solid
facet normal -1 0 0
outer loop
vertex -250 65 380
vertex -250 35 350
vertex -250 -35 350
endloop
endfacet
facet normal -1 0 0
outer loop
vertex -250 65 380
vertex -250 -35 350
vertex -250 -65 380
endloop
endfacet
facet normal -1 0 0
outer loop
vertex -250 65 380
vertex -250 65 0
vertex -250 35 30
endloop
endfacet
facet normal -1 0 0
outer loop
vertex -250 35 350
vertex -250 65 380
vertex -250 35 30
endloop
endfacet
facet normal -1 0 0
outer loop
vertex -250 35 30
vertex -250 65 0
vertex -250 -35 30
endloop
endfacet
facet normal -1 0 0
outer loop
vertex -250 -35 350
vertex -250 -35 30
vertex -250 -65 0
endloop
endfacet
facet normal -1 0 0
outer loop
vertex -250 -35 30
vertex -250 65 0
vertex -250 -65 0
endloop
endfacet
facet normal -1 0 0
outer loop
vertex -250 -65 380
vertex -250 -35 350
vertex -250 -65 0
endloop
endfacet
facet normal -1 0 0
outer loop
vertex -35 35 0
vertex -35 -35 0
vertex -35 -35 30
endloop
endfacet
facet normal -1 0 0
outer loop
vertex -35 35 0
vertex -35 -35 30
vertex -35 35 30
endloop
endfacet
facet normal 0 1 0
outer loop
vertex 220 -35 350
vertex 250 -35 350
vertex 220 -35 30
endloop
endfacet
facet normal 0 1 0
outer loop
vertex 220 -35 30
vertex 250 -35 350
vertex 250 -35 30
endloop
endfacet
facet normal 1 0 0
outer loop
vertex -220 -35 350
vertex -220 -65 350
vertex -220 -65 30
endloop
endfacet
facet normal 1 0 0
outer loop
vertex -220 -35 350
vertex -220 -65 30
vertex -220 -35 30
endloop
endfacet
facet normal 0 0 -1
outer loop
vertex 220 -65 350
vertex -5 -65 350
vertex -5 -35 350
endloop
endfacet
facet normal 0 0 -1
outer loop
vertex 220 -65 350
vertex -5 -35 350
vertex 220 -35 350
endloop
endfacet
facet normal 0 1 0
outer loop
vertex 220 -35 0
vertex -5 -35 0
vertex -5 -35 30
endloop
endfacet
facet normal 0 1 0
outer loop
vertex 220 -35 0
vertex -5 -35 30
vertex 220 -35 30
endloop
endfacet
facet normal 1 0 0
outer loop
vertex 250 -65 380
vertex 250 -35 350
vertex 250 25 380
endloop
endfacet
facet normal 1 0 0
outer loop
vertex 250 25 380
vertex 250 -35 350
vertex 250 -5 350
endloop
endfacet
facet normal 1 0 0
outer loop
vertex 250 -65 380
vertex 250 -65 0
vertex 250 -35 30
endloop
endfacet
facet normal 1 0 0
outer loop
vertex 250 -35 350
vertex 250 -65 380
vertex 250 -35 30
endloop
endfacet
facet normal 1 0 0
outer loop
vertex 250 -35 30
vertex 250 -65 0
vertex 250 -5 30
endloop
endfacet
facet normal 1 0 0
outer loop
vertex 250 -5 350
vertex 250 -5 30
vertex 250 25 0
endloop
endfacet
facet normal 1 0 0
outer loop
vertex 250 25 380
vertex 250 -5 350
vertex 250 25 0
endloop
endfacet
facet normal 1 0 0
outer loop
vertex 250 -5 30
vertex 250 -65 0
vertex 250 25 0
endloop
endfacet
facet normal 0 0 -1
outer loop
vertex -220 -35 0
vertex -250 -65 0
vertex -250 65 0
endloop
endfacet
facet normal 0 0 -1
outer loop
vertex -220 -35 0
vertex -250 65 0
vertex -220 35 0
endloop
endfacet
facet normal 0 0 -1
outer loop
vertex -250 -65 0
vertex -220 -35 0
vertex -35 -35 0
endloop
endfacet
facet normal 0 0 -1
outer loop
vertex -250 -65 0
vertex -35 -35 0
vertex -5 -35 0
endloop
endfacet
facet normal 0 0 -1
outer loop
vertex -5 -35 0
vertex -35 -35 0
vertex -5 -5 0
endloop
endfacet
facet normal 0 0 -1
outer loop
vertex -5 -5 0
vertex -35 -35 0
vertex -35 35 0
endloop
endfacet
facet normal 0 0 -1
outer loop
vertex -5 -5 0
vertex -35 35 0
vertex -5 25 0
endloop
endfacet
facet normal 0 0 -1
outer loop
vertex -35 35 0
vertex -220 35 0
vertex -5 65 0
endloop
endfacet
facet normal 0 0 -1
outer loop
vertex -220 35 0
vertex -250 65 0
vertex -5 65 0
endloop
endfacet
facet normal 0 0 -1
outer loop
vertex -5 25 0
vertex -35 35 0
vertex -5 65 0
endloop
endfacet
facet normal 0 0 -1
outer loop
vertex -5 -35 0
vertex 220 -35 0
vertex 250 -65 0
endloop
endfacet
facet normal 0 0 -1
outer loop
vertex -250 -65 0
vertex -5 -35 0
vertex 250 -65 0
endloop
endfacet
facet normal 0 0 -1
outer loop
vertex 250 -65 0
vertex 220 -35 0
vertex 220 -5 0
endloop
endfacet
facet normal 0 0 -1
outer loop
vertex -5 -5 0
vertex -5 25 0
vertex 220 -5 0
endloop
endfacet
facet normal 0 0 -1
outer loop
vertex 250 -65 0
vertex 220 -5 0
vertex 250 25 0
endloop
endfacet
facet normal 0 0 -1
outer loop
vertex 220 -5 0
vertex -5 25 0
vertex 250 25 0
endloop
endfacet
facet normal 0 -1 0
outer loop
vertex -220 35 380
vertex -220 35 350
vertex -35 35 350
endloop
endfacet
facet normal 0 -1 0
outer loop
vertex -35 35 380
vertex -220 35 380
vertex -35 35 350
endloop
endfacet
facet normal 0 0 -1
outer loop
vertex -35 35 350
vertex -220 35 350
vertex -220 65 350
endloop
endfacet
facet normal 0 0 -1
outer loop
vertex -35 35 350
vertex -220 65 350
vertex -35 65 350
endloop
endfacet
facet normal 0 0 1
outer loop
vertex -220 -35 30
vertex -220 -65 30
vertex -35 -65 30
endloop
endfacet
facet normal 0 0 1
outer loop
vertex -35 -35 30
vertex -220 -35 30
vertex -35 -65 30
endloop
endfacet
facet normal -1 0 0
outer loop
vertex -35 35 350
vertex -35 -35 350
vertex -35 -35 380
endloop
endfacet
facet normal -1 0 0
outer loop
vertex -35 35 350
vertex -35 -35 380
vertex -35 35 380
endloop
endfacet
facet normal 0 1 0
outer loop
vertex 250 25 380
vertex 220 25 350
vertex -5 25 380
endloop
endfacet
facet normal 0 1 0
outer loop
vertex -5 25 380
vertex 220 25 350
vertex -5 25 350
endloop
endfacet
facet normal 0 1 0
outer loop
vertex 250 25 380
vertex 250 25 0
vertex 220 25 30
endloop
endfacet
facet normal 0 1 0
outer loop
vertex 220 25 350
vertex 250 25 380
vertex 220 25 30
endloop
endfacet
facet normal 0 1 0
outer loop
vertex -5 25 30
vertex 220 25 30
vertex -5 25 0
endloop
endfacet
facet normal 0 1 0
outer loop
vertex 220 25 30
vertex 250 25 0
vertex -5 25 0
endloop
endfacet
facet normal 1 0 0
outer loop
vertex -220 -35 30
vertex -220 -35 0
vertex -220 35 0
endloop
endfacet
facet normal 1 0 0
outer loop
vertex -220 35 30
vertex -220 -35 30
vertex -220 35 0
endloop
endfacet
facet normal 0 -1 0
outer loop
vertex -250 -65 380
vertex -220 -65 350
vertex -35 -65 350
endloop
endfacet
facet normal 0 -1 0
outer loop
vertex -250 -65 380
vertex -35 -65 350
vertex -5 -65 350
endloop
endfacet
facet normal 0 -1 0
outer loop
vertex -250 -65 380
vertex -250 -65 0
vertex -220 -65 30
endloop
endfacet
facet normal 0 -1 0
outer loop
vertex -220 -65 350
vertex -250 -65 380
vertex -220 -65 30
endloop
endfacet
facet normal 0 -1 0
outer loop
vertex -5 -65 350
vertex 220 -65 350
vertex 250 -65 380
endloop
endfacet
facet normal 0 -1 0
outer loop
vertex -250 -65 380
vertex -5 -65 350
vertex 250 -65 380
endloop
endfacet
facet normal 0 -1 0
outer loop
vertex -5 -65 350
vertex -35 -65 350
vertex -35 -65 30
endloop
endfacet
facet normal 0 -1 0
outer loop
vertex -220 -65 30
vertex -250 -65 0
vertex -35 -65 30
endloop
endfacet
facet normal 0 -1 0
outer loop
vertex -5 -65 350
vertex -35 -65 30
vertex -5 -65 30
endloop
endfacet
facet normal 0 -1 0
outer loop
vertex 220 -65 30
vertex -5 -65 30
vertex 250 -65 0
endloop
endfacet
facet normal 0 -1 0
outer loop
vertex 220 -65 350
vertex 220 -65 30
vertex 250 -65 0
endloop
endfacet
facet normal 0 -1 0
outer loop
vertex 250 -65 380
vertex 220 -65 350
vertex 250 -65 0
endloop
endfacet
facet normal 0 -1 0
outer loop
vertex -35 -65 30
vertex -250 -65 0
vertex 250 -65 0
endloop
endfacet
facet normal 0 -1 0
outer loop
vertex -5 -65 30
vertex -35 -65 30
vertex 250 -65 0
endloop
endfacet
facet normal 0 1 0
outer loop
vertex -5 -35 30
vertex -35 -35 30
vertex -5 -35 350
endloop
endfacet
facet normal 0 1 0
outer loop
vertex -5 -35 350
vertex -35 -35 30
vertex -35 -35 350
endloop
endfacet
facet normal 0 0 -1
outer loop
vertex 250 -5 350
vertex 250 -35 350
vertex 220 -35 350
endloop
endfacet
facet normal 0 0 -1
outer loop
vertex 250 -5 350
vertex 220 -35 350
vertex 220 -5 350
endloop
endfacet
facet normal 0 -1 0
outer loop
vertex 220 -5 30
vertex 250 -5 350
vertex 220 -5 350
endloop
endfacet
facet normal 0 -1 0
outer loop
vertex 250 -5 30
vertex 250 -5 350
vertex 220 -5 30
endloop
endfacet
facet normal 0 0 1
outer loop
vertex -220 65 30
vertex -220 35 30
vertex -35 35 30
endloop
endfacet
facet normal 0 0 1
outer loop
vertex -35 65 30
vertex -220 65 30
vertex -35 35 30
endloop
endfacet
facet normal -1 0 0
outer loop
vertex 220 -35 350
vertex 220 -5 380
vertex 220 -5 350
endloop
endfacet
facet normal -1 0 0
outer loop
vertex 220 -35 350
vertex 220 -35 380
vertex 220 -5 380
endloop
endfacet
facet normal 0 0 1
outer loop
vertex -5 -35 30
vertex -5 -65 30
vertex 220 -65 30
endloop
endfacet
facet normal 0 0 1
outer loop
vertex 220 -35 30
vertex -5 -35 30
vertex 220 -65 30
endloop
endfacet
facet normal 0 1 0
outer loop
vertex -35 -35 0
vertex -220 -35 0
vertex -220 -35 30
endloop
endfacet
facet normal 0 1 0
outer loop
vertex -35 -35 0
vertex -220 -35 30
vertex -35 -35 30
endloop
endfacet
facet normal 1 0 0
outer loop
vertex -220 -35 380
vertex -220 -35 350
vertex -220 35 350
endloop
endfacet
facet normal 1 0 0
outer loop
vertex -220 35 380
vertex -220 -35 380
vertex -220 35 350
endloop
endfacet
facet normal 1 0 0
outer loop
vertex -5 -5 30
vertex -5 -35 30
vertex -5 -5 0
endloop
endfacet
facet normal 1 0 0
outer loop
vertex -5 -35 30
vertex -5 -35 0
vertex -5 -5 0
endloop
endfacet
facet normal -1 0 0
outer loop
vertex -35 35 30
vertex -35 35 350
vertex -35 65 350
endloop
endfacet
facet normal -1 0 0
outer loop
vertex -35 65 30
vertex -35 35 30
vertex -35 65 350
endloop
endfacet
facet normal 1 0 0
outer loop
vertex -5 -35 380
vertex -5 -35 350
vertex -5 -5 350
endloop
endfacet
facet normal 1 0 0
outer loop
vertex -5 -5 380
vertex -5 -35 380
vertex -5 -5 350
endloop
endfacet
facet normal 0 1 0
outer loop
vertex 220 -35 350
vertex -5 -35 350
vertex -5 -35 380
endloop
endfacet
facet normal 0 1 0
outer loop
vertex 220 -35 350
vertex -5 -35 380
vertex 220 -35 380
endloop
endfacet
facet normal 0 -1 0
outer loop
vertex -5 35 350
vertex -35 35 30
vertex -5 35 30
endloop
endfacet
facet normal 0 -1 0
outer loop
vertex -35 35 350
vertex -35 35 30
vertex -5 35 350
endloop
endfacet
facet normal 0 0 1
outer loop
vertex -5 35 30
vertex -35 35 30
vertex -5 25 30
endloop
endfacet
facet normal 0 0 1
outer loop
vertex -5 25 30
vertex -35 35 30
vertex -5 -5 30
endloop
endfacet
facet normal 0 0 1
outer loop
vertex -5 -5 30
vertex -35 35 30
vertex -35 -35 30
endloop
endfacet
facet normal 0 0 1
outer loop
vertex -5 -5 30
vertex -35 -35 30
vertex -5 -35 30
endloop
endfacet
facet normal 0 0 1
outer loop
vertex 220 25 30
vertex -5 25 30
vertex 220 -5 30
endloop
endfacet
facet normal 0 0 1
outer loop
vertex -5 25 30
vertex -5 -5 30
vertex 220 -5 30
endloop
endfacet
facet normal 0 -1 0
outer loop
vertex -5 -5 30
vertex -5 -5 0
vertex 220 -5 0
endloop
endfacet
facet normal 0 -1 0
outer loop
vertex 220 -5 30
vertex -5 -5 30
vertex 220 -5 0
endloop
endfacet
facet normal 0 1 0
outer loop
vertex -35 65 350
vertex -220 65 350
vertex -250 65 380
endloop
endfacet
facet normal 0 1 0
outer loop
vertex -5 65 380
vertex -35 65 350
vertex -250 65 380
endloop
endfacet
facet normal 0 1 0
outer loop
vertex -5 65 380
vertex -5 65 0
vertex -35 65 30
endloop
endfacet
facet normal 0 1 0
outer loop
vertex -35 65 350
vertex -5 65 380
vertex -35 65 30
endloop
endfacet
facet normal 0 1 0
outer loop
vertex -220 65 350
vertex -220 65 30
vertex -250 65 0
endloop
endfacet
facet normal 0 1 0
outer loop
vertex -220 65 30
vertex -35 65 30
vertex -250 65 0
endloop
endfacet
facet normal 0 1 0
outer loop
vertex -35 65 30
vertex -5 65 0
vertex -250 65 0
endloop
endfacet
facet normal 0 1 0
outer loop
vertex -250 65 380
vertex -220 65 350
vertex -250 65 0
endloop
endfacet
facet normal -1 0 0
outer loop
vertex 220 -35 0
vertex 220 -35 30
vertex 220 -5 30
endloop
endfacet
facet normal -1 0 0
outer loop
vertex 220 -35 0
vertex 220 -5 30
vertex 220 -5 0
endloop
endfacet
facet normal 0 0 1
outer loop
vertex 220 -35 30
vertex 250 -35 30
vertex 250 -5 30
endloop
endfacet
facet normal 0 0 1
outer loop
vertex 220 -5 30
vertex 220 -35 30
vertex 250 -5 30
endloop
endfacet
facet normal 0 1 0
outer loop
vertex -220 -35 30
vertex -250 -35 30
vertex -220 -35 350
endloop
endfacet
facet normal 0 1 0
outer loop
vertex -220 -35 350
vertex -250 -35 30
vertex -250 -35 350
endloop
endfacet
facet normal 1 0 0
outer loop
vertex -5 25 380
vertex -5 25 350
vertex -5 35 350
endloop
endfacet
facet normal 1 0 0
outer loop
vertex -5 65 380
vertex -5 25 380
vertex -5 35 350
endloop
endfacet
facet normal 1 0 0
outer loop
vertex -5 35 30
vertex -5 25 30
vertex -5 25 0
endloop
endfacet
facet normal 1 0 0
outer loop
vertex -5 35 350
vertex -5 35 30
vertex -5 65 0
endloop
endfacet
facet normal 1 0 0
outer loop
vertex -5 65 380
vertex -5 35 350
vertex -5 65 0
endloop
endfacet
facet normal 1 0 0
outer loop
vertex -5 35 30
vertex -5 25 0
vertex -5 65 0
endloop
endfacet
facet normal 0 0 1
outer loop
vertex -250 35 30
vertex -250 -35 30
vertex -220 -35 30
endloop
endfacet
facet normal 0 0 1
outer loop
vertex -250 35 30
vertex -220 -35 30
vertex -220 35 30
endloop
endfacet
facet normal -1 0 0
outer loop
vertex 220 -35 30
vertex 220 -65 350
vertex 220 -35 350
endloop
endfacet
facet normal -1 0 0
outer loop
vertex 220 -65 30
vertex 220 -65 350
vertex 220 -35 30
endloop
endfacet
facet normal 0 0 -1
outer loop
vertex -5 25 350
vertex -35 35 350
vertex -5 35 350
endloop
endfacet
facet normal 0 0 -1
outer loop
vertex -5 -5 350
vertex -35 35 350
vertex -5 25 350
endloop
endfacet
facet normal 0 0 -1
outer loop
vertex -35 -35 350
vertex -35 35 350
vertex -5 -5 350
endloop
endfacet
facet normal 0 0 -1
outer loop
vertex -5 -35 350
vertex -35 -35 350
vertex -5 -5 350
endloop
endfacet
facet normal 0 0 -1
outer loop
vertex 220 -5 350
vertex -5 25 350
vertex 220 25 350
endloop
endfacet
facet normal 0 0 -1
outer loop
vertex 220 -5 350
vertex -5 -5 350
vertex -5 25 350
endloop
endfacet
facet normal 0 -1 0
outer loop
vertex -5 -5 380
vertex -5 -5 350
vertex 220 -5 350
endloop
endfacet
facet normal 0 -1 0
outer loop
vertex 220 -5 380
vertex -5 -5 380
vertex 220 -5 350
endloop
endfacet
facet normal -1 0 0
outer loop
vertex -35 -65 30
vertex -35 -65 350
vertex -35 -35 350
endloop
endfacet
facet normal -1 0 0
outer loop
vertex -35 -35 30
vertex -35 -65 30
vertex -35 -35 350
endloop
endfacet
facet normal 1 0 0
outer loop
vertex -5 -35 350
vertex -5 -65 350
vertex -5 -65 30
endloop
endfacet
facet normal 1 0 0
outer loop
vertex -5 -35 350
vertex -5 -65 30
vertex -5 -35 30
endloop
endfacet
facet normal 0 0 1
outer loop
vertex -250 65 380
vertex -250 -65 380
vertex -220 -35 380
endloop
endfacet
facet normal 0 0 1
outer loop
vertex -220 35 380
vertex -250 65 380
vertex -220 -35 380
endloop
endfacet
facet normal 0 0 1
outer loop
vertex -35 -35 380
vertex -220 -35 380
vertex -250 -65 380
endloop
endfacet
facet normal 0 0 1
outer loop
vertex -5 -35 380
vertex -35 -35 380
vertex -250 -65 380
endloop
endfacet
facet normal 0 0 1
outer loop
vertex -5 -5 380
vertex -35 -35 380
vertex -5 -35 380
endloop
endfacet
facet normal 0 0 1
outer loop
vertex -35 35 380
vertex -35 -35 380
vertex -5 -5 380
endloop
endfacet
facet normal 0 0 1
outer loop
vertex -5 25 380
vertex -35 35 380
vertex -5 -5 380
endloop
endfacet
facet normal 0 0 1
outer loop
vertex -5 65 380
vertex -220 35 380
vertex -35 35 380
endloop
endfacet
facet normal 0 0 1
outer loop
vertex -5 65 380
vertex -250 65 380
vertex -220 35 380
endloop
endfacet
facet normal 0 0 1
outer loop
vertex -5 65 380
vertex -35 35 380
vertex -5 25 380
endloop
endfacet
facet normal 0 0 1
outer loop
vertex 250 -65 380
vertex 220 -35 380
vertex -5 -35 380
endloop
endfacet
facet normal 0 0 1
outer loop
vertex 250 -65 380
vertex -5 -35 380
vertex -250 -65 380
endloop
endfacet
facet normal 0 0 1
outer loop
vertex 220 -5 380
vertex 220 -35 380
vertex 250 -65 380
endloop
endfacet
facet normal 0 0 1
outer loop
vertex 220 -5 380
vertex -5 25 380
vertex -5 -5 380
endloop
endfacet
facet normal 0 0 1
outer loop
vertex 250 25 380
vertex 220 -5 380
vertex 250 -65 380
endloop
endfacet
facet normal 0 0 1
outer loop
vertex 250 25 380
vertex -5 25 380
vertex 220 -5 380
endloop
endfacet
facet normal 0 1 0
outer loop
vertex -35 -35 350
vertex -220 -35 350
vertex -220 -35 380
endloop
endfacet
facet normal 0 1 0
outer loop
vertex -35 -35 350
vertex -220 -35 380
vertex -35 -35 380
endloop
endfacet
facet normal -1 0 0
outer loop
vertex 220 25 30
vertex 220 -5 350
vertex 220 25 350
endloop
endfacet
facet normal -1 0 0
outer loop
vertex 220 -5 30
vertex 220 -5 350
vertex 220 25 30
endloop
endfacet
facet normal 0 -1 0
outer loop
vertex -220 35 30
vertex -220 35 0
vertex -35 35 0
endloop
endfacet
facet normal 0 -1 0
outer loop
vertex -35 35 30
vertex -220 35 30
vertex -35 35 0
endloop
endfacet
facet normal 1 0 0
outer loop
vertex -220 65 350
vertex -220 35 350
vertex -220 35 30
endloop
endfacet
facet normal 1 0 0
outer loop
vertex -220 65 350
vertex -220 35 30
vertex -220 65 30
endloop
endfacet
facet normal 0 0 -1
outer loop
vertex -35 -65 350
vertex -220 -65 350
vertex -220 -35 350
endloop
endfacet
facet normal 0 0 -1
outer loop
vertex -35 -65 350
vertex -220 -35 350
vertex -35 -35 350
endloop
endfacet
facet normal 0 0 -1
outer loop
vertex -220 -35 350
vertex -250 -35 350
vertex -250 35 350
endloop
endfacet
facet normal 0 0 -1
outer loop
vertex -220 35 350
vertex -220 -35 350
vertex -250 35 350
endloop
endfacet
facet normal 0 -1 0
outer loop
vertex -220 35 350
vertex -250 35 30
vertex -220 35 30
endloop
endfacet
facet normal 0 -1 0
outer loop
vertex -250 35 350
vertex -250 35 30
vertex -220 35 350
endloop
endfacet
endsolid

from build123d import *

# Parameters (mm, degrees)
SKETCH1_W                = 185
SKETCH1_H                = 70
SKETCH1_W_2              = 225
SKETCH1_H_2              = 30
BOSS_EXTRUDE1_DEPTH      = 380
CUT_EXTRUDE1_START       = -130
CUT_EXTRUDE1_OUTLINE_W   = 225
CUT_EXTRUDE1_OUTLINE_H   = 320
CUT_EXTRUDE1_OUTLINE_W_2 = 185
CUT_EXTRUDE1_DEPTH       = 130
SKETCH3_W                = 320
SKETCH3_H                = 30
CUT_EXTRUDE2_DEPTH       = 30
SKETCH4_W                = 320
SKETCH4_H                = 70
CUT_EXTRUDE3_DEPTH       = 245


# Read off the part's stored shape, not the designer's step: Cut-Extrude1
with BuildPart() as part:
    # Sketch1 → Boss-Extrude1 (new body)
    with BuildSketch(Plane.XY):
        Polygon((250, 25), (-5, 25), (-5, 65), (-250, 65), (-250, -65), (250, -65), align=None)
        with Locations((-127.5, 0)):
            Rectangle(SKETCH1_W, SKETCH1_H, mode=Mode.SUBTRACT)
        with Locations((107.5, -20)):
            Rectangle(SKETCH1_W_2, SKETCH1_H_2, mode=Mode.SUBTRACT)
    extrude(amount=BOSS_EXTRUDE1_DEPTH)

    # Cut-Extrude1 outline → Cut-Extrude1 (cut)
    with BuildSketch(Plane(origin=(0, 65, 0), x_dir=(1, 0, 0), z_dir=(0, 1, 0)).offset(CUT_EXTRUDE1_START)):
        with Locations((107.5, -190)):
            Rectangle(CUT_EXTRUDE1_OUTLINE_W, CUT_EXTRUDE1_OUTLINE_H)
        with Locations((-127.5, -190)):
            Rectangle(CUT_EXTRUDE1_OUTLINE_W_2, CUT_EXTRUDE1_OUTLINE_H)
    extrude(amount=CUT_EXTRUDE1_DEPTH, mode=Mode.SUBTRACT)

    # Sketch3 → Cut-Extrude2 (cut)
    with BuildSketch(Plane(origin=(250, 0, 0), x_dir=(0, 0, -1), z_dir=(1, 0, 0))):
        with Locations((-190, -20)):
            Rectangle(SKETCH3_W, SKETCH3_H)
    extrude(amount=-CUT_EXTRUDE2_DEPTH, mode=Mode.SUBTRACT)

    # Sketch4 → Cut-Extrude3 (cut)
    with BuildSketch(Plane.ZY.offset(250)):
        with Locations((190, 0)):
            Rectangle(SKETCH4_W, SKETCH4_H)
    extrude(amount=-CUT_EXTRUDE3_DEPTH, mode=Mode.SUBTRACT)


solid = part.part
